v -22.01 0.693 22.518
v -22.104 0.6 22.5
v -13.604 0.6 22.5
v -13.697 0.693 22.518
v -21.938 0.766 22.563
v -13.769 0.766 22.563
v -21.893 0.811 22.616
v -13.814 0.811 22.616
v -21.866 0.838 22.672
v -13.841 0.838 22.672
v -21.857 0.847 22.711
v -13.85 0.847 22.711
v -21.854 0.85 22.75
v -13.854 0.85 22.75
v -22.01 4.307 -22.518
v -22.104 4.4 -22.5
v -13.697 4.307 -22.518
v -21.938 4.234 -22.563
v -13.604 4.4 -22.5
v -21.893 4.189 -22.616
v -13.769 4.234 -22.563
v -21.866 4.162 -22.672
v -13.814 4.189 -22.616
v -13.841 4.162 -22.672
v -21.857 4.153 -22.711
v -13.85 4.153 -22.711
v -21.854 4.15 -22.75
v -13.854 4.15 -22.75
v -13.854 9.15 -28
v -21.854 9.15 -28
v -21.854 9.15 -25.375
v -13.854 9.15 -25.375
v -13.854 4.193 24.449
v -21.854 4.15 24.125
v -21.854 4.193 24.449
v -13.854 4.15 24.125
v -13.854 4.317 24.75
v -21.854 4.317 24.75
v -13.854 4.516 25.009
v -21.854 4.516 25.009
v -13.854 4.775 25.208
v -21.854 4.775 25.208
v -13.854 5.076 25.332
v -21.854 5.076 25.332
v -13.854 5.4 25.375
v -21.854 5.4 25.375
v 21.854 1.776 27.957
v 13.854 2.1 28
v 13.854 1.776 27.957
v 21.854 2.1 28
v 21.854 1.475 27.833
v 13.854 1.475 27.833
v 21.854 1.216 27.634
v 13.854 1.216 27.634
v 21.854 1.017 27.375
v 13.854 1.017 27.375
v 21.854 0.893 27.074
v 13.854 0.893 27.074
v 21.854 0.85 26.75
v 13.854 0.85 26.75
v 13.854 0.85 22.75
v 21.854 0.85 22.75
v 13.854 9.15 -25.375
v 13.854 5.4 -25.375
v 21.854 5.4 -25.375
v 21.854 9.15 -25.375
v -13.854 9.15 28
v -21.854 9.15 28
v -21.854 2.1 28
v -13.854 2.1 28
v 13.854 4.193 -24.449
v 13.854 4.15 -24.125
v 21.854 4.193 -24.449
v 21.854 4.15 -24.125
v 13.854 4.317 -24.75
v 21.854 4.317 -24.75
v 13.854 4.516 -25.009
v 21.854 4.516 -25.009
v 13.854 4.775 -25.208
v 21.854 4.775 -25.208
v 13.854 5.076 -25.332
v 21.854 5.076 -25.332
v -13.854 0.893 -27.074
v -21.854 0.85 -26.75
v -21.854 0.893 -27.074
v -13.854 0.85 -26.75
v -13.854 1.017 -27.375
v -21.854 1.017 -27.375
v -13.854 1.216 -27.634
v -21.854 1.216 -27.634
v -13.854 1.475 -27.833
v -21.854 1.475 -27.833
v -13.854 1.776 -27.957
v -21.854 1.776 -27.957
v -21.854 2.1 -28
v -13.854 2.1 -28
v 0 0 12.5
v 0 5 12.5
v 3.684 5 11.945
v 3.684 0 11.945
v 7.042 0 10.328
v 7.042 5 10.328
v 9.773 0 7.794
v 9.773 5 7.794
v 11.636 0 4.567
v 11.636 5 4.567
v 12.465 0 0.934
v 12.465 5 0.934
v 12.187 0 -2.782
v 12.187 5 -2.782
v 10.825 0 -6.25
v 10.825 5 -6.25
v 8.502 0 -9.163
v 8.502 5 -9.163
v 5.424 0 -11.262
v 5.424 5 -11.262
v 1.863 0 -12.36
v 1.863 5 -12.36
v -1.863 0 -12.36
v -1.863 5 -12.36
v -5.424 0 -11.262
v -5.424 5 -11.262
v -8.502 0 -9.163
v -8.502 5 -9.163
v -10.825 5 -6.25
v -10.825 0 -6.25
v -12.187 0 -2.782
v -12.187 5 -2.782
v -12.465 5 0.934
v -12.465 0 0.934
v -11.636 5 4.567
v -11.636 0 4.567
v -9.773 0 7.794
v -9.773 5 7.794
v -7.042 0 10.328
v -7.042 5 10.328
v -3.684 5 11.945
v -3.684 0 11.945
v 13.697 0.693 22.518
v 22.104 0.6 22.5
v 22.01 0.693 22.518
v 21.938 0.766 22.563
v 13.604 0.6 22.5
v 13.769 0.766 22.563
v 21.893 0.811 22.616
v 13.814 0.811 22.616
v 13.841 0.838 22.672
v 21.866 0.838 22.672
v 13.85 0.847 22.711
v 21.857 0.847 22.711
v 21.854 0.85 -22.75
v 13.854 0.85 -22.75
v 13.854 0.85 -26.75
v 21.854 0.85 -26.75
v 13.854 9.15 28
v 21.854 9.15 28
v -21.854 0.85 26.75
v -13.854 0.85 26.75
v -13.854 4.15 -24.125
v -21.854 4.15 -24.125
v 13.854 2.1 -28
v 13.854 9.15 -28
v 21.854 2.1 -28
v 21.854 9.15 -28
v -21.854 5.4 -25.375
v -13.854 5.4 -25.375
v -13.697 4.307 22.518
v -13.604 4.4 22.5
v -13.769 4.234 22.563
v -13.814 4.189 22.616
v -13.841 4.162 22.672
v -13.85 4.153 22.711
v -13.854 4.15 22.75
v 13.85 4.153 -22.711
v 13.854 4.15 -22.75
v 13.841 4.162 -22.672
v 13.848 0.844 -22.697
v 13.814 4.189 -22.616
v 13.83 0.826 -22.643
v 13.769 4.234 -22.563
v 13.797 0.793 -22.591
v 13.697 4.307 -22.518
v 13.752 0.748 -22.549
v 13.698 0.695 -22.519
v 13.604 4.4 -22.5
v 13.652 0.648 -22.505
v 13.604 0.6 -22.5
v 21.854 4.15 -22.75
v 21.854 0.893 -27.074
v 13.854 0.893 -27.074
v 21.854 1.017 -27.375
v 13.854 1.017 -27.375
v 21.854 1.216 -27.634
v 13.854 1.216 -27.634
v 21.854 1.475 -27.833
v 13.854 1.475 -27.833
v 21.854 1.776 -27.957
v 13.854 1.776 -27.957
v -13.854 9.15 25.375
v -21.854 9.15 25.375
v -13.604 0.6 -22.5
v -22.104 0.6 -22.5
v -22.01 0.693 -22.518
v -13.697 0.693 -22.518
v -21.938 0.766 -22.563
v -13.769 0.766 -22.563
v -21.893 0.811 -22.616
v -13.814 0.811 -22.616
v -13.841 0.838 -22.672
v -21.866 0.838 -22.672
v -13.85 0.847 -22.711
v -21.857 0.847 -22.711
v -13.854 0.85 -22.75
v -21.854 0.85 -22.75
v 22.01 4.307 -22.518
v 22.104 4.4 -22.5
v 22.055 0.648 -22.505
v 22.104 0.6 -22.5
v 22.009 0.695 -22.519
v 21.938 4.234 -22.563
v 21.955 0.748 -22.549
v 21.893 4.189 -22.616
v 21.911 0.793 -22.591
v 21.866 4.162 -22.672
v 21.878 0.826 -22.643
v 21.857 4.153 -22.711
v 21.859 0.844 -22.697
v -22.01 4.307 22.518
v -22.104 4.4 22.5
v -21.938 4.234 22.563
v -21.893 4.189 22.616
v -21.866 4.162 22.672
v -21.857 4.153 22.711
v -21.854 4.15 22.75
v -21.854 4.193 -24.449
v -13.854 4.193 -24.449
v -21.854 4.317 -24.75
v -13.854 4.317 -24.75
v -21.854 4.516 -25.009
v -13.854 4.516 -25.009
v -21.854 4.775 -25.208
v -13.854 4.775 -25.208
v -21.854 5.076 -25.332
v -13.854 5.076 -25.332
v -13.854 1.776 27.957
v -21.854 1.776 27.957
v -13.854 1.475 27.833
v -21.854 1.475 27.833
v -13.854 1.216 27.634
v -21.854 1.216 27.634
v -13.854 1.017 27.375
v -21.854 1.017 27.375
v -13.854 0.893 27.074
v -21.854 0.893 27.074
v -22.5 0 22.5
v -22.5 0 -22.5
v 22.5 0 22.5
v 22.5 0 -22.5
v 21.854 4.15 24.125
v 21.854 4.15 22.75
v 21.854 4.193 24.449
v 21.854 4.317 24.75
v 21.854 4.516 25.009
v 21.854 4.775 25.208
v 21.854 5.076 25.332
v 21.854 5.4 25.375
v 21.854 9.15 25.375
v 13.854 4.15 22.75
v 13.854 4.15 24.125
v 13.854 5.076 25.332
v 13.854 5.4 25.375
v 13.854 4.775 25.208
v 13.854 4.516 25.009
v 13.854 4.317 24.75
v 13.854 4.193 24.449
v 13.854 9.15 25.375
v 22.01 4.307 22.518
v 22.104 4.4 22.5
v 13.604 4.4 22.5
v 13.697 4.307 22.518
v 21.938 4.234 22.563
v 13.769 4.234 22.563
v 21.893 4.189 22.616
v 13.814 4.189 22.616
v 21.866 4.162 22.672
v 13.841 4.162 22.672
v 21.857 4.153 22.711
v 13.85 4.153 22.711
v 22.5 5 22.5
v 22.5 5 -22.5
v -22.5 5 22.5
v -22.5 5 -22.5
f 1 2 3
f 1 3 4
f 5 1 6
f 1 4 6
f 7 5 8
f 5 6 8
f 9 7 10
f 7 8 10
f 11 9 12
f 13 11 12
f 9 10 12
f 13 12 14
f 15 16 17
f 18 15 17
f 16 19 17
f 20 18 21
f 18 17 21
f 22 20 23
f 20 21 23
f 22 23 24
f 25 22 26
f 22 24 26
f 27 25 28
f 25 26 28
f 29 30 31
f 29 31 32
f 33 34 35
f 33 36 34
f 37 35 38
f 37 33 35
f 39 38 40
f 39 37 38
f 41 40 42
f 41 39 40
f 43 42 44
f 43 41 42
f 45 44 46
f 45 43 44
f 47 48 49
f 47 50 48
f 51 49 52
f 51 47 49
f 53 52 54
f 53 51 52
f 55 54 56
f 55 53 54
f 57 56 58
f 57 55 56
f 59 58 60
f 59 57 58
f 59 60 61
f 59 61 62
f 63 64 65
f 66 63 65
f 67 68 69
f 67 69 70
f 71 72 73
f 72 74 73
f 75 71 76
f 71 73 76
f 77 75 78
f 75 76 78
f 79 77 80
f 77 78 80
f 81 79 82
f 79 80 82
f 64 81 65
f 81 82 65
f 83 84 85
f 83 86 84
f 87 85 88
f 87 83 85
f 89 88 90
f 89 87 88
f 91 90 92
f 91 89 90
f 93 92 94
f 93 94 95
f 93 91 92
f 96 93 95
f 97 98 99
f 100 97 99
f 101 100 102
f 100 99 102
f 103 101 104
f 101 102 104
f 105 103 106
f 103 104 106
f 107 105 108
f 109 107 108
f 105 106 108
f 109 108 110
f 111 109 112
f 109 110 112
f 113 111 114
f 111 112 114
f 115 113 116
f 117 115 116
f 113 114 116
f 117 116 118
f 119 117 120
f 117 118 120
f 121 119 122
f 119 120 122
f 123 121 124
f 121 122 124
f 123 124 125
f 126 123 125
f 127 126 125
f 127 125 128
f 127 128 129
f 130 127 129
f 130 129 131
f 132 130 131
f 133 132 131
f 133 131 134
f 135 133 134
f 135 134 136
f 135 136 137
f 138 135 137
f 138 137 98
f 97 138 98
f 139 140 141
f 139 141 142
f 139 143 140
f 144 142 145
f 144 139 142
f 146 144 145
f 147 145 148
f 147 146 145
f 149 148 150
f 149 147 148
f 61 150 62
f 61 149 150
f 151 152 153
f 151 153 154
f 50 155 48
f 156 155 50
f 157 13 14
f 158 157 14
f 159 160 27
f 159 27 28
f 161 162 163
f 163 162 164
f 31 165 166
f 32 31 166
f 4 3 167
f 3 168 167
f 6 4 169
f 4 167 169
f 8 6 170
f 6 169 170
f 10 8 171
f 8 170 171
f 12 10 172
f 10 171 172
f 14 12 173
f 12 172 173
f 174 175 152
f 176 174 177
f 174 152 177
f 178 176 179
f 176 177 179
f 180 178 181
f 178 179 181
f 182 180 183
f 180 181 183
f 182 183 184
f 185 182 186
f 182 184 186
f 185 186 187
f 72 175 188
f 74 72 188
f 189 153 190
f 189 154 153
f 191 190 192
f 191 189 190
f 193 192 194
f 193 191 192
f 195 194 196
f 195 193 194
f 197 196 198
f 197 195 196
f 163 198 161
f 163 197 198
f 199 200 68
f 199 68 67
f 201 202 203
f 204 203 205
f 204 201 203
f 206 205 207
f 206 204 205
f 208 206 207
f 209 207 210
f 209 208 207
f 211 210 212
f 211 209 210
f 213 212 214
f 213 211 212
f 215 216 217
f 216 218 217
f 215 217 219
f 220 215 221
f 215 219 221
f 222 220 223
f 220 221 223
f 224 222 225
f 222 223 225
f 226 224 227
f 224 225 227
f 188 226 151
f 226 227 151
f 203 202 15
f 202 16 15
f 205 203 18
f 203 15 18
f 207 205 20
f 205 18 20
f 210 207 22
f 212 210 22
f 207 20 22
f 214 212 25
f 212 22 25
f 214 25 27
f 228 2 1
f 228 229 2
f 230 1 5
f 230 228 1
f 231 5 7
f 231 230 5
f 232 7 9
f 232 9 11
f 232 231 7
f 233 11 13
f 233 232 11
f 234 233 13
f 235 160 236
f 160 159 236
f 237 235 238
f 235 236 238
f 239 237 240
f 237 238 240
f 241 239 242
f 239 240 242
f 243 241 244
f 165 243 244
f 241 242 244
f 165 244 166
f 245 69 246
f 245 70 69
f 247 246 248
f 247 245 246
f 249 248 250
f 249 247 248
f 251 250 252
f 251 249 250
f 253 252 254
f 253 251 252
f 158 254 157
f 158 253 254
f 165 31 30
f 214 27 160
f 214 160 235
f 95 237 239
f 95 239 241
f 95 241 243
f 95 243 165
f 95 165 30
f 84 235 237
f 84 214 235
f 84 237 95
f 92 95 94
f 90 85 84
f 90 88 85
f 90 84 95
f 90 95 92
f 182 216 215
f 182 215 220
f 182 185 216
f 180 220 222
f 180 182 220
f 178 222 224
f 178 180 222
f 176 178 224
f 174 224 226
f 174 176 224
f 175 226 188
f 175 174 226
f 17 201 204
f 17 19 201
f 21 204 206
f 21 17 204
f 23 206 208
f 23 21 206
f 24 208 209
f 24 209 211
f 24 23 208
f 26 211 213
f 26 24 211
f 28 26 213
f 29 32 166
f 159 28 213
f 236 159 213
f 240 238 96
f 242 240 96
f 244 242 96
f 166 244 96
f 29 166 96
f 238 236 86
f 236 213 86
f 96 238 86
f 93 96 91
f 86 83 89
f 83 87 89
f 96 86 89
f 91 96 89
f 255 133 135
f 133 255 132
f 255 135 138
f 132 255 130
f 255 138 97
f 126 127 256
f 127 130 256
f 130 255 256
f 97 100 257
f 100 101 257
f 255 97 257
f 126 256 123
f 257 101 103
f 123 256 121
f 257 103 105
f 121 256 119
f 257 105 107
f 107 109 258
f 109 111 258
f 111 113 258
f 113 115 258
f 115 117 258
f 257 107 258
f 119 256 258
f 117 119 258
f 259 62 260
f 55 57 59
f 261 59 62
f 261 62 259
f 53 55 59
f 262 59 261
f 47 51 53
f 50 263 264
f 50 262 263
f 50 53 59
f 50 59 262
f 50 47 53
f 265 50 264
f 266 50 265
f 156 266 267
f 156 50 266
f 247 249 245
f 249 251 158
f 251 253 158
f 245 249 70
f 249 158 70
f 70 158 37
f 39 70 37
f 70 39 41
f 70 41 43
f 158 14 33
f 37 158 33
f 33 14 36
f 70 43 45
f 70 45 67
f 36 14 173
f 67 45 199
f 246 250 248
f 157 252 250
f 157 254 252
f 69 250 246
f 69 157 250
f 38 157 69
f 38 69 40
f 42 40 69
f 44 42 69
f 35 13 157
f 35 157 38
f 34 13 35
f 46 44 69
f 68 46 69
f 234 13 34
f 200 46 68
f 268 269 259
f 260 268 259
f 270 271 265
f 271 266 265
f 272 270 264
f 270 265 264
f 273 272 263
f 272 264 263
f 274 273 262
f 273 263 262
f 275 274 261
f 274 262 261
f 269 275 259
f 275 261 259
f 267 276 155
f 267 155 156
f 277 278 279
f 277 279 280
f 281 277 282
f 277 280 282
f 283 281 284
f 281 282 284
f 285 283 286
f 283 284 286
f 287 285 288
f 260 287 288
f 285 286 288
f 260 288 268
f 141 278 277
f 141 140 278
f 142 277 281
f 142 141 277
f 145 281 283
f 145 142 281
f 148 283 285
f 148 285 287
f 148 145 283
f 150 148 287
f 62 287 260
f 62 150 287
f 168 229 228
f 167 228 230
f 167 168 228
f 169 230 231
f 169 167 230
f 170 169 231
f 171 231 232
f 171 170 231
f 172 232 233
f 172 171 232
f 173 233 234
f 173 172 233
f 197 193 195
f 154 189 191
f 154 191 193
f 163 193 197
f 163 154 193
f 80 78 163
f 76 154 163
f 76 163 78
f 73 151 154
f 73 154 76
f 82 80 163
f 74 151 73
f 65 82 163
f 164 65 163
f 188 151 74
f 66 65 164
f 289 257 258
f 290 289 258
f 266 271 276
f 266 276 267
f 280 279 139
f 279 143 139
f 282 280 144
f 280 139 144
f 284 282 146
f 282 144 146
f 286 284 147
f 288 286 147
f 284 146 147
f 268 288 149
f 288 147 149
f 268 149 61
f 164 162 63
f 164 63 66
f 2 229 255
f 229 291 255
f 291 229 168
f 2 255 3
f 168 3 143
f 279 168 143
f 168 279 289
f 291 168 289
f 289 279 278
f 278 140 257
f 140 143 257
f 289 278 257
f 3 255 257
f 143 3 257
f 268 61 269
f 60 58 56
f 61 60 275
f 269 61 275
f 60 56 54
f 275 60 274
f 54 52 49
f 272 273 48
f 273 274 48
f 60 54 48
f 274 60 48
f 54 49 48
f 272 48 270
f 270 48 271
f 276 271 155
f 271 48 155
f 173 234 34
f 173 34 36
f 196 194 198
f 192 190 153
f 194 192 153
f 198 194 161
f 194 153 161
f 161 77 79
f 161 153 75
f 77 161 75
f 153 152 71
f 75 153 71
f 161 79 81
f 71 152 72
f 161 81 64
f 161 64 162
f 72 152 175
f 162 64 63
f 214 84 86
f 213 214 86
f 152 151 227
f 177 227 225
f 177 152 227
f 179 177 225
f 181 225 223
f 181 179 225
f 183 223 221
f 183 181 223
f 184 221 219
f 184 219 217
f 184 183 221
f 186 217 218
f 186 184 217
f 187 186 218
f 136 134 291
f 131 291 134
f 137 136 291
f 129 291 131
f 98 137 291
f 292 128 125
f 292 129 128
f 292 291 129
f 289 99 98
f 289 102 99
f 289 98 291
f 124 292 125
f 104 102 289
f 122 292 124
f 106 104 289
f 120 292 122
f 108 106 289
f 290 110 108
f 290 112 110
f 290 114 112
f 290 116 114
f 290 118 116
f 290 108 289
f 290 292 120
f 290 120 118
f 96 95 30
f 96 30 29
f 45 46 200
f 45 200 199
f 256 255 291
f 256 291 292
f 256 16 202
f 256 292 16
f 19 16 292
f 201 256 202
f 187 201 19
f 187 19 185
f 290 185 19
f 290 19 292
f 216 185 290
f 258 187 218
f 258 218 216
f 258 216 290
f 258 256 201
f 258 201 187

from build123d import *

# Parameters (mm, degrees)
SKETCH2_W           = 45
SKETCH2_H           = 45
BOSS_EXTRUDE1_DEPTH = 5
SKETCH3_W           = 8
SKETCH3_H           = 3.3
BOSS_EXTRUDE2_DEPTH = 28
FILLET1_R           = 0.25
SKETCH4_W           = 8
SKETCH4_H           = 2.625
BOSS_EXTRUDE3_DEPTH = 5
FILLET2_R           = 1.25
SKETCH6_R           = 12.5
CUT_EXTRUDE1_DEPTH  = 19


with BuildPart() as part:
    # Sketch2 → Boss-Extrude1 (new body)
    with BuildSketch(Plane(origin=(0, 0, 0), x_dir=(1, 0, 0), z_dir=(0, 1, 0))):
        Rectangle(SKETCH2_W, SKETCH2_H)
    extrude(amount=BOSS_EXTRUDE1_DEPTH)

    # Sketch3 → Boss-Extrude2 (add, symmetric)
    with BuildSketch(Plane.XY):
        with Locations((-17.853613933, 2.5)):
            Rectangle(SKETCH3_W, SKETCH3_H)
        with Locations((17.853613933, 2.5)):
            Rectangle(SKETCH3_W, SKETCH3_H)
    extrude(amount=BOSS_EXTRUDE2_DEPTH, both=True)

    # Fillet1
    fillet1_edges = [part.edges().sort_by_distance(p)[0] for p in [
        (21.853613933, 2.5, 22.5),
        (17.853613933, 0.85, 22.5),
        (13.853613933, 2.5, 22.5),
        (17.853613933, 4.15, 22.5),
        (-17.853613933, 0.85, 22.5),
        (-21.853613933, 2.5, 22.5),
        (-17.853613933, 4.15, 22.5),
        (-13.853613933, 2.5, 22.5),
        (-13.853613933, 2.5, -22.5),
        (-17.853613933, 4.15, -22.5),
        (-21.853613933, 2.5, -22.5),
        (-17.853613933, 0.85, -22.5),
        (17.853613933, 4.15, -22.5),
        (13.853613933, 2.5, -22.5),
        (17.853613933, 0.85, -22.5),
        (21.853613933, 2.5, -22.5),
    ]]
    fillet(fillet1_edges, radius=FILLET1_R)

    # Sketch4 → Boss-Extrude3 (add)
    with BuildSketch(Plane(origin=(0, 4.15, 0), x_dir=(1, 0, 0), z_dir=(0, 1, 0))):
        with Locations((-17.853613933, 26.6875)):
            Rectangle(SKETCH4_W, SKETCH4_H)
        with Locations((17.853613933, 26.6875)):
            Rectangle(SKETCH4_W, SKETCH4_H)
        with Locations((17.853613933, -26.6875)):
            Rectangle(SKETCH4_W, SKETCH4_H)
        with Locations((-17.853613933, -26.6875)):
            Rectangle(SKETCH4_W, SKETCH4_H)
    extrude(amount=BOSS_EXTRUDE3_DEPTH)

    # Fillet2
    fillet2_edges = [part.edges().sort_by_distance(p)[0] for p in [
        (-17.853613933, 4.15, 25.375),
        (17.853613933, 4.15, 25.375),
        (17.853613933, 4.15, -25.375),
        (-17.853613933, 4.15, -25.375),
        (-17.853613933, 0.85, -28),
        (-17.853613933, 0.85, 28),
        (17.853613933, 0.85, -28),
        (17.853613933, 0.85, 28),
    ]]
    fillet(fillet2_edges, radius=FILLET2_R)

    # Sketch6 → Cut-Extrude1 (cut)
    with BuildSketch(Plane(origin=(0, 5, 0), x_dir=(1, 0, 0), z_dir=(0, 1, 0))):
        with Locations(Location((0, 0, 0), (0, 0, 270))):
            Circle(SKETCH6_R)
    extrude(amount=-CUT_EXTRUDE1_DEPTH, mode=Mode.SUBTRACT)


solid = part.part
